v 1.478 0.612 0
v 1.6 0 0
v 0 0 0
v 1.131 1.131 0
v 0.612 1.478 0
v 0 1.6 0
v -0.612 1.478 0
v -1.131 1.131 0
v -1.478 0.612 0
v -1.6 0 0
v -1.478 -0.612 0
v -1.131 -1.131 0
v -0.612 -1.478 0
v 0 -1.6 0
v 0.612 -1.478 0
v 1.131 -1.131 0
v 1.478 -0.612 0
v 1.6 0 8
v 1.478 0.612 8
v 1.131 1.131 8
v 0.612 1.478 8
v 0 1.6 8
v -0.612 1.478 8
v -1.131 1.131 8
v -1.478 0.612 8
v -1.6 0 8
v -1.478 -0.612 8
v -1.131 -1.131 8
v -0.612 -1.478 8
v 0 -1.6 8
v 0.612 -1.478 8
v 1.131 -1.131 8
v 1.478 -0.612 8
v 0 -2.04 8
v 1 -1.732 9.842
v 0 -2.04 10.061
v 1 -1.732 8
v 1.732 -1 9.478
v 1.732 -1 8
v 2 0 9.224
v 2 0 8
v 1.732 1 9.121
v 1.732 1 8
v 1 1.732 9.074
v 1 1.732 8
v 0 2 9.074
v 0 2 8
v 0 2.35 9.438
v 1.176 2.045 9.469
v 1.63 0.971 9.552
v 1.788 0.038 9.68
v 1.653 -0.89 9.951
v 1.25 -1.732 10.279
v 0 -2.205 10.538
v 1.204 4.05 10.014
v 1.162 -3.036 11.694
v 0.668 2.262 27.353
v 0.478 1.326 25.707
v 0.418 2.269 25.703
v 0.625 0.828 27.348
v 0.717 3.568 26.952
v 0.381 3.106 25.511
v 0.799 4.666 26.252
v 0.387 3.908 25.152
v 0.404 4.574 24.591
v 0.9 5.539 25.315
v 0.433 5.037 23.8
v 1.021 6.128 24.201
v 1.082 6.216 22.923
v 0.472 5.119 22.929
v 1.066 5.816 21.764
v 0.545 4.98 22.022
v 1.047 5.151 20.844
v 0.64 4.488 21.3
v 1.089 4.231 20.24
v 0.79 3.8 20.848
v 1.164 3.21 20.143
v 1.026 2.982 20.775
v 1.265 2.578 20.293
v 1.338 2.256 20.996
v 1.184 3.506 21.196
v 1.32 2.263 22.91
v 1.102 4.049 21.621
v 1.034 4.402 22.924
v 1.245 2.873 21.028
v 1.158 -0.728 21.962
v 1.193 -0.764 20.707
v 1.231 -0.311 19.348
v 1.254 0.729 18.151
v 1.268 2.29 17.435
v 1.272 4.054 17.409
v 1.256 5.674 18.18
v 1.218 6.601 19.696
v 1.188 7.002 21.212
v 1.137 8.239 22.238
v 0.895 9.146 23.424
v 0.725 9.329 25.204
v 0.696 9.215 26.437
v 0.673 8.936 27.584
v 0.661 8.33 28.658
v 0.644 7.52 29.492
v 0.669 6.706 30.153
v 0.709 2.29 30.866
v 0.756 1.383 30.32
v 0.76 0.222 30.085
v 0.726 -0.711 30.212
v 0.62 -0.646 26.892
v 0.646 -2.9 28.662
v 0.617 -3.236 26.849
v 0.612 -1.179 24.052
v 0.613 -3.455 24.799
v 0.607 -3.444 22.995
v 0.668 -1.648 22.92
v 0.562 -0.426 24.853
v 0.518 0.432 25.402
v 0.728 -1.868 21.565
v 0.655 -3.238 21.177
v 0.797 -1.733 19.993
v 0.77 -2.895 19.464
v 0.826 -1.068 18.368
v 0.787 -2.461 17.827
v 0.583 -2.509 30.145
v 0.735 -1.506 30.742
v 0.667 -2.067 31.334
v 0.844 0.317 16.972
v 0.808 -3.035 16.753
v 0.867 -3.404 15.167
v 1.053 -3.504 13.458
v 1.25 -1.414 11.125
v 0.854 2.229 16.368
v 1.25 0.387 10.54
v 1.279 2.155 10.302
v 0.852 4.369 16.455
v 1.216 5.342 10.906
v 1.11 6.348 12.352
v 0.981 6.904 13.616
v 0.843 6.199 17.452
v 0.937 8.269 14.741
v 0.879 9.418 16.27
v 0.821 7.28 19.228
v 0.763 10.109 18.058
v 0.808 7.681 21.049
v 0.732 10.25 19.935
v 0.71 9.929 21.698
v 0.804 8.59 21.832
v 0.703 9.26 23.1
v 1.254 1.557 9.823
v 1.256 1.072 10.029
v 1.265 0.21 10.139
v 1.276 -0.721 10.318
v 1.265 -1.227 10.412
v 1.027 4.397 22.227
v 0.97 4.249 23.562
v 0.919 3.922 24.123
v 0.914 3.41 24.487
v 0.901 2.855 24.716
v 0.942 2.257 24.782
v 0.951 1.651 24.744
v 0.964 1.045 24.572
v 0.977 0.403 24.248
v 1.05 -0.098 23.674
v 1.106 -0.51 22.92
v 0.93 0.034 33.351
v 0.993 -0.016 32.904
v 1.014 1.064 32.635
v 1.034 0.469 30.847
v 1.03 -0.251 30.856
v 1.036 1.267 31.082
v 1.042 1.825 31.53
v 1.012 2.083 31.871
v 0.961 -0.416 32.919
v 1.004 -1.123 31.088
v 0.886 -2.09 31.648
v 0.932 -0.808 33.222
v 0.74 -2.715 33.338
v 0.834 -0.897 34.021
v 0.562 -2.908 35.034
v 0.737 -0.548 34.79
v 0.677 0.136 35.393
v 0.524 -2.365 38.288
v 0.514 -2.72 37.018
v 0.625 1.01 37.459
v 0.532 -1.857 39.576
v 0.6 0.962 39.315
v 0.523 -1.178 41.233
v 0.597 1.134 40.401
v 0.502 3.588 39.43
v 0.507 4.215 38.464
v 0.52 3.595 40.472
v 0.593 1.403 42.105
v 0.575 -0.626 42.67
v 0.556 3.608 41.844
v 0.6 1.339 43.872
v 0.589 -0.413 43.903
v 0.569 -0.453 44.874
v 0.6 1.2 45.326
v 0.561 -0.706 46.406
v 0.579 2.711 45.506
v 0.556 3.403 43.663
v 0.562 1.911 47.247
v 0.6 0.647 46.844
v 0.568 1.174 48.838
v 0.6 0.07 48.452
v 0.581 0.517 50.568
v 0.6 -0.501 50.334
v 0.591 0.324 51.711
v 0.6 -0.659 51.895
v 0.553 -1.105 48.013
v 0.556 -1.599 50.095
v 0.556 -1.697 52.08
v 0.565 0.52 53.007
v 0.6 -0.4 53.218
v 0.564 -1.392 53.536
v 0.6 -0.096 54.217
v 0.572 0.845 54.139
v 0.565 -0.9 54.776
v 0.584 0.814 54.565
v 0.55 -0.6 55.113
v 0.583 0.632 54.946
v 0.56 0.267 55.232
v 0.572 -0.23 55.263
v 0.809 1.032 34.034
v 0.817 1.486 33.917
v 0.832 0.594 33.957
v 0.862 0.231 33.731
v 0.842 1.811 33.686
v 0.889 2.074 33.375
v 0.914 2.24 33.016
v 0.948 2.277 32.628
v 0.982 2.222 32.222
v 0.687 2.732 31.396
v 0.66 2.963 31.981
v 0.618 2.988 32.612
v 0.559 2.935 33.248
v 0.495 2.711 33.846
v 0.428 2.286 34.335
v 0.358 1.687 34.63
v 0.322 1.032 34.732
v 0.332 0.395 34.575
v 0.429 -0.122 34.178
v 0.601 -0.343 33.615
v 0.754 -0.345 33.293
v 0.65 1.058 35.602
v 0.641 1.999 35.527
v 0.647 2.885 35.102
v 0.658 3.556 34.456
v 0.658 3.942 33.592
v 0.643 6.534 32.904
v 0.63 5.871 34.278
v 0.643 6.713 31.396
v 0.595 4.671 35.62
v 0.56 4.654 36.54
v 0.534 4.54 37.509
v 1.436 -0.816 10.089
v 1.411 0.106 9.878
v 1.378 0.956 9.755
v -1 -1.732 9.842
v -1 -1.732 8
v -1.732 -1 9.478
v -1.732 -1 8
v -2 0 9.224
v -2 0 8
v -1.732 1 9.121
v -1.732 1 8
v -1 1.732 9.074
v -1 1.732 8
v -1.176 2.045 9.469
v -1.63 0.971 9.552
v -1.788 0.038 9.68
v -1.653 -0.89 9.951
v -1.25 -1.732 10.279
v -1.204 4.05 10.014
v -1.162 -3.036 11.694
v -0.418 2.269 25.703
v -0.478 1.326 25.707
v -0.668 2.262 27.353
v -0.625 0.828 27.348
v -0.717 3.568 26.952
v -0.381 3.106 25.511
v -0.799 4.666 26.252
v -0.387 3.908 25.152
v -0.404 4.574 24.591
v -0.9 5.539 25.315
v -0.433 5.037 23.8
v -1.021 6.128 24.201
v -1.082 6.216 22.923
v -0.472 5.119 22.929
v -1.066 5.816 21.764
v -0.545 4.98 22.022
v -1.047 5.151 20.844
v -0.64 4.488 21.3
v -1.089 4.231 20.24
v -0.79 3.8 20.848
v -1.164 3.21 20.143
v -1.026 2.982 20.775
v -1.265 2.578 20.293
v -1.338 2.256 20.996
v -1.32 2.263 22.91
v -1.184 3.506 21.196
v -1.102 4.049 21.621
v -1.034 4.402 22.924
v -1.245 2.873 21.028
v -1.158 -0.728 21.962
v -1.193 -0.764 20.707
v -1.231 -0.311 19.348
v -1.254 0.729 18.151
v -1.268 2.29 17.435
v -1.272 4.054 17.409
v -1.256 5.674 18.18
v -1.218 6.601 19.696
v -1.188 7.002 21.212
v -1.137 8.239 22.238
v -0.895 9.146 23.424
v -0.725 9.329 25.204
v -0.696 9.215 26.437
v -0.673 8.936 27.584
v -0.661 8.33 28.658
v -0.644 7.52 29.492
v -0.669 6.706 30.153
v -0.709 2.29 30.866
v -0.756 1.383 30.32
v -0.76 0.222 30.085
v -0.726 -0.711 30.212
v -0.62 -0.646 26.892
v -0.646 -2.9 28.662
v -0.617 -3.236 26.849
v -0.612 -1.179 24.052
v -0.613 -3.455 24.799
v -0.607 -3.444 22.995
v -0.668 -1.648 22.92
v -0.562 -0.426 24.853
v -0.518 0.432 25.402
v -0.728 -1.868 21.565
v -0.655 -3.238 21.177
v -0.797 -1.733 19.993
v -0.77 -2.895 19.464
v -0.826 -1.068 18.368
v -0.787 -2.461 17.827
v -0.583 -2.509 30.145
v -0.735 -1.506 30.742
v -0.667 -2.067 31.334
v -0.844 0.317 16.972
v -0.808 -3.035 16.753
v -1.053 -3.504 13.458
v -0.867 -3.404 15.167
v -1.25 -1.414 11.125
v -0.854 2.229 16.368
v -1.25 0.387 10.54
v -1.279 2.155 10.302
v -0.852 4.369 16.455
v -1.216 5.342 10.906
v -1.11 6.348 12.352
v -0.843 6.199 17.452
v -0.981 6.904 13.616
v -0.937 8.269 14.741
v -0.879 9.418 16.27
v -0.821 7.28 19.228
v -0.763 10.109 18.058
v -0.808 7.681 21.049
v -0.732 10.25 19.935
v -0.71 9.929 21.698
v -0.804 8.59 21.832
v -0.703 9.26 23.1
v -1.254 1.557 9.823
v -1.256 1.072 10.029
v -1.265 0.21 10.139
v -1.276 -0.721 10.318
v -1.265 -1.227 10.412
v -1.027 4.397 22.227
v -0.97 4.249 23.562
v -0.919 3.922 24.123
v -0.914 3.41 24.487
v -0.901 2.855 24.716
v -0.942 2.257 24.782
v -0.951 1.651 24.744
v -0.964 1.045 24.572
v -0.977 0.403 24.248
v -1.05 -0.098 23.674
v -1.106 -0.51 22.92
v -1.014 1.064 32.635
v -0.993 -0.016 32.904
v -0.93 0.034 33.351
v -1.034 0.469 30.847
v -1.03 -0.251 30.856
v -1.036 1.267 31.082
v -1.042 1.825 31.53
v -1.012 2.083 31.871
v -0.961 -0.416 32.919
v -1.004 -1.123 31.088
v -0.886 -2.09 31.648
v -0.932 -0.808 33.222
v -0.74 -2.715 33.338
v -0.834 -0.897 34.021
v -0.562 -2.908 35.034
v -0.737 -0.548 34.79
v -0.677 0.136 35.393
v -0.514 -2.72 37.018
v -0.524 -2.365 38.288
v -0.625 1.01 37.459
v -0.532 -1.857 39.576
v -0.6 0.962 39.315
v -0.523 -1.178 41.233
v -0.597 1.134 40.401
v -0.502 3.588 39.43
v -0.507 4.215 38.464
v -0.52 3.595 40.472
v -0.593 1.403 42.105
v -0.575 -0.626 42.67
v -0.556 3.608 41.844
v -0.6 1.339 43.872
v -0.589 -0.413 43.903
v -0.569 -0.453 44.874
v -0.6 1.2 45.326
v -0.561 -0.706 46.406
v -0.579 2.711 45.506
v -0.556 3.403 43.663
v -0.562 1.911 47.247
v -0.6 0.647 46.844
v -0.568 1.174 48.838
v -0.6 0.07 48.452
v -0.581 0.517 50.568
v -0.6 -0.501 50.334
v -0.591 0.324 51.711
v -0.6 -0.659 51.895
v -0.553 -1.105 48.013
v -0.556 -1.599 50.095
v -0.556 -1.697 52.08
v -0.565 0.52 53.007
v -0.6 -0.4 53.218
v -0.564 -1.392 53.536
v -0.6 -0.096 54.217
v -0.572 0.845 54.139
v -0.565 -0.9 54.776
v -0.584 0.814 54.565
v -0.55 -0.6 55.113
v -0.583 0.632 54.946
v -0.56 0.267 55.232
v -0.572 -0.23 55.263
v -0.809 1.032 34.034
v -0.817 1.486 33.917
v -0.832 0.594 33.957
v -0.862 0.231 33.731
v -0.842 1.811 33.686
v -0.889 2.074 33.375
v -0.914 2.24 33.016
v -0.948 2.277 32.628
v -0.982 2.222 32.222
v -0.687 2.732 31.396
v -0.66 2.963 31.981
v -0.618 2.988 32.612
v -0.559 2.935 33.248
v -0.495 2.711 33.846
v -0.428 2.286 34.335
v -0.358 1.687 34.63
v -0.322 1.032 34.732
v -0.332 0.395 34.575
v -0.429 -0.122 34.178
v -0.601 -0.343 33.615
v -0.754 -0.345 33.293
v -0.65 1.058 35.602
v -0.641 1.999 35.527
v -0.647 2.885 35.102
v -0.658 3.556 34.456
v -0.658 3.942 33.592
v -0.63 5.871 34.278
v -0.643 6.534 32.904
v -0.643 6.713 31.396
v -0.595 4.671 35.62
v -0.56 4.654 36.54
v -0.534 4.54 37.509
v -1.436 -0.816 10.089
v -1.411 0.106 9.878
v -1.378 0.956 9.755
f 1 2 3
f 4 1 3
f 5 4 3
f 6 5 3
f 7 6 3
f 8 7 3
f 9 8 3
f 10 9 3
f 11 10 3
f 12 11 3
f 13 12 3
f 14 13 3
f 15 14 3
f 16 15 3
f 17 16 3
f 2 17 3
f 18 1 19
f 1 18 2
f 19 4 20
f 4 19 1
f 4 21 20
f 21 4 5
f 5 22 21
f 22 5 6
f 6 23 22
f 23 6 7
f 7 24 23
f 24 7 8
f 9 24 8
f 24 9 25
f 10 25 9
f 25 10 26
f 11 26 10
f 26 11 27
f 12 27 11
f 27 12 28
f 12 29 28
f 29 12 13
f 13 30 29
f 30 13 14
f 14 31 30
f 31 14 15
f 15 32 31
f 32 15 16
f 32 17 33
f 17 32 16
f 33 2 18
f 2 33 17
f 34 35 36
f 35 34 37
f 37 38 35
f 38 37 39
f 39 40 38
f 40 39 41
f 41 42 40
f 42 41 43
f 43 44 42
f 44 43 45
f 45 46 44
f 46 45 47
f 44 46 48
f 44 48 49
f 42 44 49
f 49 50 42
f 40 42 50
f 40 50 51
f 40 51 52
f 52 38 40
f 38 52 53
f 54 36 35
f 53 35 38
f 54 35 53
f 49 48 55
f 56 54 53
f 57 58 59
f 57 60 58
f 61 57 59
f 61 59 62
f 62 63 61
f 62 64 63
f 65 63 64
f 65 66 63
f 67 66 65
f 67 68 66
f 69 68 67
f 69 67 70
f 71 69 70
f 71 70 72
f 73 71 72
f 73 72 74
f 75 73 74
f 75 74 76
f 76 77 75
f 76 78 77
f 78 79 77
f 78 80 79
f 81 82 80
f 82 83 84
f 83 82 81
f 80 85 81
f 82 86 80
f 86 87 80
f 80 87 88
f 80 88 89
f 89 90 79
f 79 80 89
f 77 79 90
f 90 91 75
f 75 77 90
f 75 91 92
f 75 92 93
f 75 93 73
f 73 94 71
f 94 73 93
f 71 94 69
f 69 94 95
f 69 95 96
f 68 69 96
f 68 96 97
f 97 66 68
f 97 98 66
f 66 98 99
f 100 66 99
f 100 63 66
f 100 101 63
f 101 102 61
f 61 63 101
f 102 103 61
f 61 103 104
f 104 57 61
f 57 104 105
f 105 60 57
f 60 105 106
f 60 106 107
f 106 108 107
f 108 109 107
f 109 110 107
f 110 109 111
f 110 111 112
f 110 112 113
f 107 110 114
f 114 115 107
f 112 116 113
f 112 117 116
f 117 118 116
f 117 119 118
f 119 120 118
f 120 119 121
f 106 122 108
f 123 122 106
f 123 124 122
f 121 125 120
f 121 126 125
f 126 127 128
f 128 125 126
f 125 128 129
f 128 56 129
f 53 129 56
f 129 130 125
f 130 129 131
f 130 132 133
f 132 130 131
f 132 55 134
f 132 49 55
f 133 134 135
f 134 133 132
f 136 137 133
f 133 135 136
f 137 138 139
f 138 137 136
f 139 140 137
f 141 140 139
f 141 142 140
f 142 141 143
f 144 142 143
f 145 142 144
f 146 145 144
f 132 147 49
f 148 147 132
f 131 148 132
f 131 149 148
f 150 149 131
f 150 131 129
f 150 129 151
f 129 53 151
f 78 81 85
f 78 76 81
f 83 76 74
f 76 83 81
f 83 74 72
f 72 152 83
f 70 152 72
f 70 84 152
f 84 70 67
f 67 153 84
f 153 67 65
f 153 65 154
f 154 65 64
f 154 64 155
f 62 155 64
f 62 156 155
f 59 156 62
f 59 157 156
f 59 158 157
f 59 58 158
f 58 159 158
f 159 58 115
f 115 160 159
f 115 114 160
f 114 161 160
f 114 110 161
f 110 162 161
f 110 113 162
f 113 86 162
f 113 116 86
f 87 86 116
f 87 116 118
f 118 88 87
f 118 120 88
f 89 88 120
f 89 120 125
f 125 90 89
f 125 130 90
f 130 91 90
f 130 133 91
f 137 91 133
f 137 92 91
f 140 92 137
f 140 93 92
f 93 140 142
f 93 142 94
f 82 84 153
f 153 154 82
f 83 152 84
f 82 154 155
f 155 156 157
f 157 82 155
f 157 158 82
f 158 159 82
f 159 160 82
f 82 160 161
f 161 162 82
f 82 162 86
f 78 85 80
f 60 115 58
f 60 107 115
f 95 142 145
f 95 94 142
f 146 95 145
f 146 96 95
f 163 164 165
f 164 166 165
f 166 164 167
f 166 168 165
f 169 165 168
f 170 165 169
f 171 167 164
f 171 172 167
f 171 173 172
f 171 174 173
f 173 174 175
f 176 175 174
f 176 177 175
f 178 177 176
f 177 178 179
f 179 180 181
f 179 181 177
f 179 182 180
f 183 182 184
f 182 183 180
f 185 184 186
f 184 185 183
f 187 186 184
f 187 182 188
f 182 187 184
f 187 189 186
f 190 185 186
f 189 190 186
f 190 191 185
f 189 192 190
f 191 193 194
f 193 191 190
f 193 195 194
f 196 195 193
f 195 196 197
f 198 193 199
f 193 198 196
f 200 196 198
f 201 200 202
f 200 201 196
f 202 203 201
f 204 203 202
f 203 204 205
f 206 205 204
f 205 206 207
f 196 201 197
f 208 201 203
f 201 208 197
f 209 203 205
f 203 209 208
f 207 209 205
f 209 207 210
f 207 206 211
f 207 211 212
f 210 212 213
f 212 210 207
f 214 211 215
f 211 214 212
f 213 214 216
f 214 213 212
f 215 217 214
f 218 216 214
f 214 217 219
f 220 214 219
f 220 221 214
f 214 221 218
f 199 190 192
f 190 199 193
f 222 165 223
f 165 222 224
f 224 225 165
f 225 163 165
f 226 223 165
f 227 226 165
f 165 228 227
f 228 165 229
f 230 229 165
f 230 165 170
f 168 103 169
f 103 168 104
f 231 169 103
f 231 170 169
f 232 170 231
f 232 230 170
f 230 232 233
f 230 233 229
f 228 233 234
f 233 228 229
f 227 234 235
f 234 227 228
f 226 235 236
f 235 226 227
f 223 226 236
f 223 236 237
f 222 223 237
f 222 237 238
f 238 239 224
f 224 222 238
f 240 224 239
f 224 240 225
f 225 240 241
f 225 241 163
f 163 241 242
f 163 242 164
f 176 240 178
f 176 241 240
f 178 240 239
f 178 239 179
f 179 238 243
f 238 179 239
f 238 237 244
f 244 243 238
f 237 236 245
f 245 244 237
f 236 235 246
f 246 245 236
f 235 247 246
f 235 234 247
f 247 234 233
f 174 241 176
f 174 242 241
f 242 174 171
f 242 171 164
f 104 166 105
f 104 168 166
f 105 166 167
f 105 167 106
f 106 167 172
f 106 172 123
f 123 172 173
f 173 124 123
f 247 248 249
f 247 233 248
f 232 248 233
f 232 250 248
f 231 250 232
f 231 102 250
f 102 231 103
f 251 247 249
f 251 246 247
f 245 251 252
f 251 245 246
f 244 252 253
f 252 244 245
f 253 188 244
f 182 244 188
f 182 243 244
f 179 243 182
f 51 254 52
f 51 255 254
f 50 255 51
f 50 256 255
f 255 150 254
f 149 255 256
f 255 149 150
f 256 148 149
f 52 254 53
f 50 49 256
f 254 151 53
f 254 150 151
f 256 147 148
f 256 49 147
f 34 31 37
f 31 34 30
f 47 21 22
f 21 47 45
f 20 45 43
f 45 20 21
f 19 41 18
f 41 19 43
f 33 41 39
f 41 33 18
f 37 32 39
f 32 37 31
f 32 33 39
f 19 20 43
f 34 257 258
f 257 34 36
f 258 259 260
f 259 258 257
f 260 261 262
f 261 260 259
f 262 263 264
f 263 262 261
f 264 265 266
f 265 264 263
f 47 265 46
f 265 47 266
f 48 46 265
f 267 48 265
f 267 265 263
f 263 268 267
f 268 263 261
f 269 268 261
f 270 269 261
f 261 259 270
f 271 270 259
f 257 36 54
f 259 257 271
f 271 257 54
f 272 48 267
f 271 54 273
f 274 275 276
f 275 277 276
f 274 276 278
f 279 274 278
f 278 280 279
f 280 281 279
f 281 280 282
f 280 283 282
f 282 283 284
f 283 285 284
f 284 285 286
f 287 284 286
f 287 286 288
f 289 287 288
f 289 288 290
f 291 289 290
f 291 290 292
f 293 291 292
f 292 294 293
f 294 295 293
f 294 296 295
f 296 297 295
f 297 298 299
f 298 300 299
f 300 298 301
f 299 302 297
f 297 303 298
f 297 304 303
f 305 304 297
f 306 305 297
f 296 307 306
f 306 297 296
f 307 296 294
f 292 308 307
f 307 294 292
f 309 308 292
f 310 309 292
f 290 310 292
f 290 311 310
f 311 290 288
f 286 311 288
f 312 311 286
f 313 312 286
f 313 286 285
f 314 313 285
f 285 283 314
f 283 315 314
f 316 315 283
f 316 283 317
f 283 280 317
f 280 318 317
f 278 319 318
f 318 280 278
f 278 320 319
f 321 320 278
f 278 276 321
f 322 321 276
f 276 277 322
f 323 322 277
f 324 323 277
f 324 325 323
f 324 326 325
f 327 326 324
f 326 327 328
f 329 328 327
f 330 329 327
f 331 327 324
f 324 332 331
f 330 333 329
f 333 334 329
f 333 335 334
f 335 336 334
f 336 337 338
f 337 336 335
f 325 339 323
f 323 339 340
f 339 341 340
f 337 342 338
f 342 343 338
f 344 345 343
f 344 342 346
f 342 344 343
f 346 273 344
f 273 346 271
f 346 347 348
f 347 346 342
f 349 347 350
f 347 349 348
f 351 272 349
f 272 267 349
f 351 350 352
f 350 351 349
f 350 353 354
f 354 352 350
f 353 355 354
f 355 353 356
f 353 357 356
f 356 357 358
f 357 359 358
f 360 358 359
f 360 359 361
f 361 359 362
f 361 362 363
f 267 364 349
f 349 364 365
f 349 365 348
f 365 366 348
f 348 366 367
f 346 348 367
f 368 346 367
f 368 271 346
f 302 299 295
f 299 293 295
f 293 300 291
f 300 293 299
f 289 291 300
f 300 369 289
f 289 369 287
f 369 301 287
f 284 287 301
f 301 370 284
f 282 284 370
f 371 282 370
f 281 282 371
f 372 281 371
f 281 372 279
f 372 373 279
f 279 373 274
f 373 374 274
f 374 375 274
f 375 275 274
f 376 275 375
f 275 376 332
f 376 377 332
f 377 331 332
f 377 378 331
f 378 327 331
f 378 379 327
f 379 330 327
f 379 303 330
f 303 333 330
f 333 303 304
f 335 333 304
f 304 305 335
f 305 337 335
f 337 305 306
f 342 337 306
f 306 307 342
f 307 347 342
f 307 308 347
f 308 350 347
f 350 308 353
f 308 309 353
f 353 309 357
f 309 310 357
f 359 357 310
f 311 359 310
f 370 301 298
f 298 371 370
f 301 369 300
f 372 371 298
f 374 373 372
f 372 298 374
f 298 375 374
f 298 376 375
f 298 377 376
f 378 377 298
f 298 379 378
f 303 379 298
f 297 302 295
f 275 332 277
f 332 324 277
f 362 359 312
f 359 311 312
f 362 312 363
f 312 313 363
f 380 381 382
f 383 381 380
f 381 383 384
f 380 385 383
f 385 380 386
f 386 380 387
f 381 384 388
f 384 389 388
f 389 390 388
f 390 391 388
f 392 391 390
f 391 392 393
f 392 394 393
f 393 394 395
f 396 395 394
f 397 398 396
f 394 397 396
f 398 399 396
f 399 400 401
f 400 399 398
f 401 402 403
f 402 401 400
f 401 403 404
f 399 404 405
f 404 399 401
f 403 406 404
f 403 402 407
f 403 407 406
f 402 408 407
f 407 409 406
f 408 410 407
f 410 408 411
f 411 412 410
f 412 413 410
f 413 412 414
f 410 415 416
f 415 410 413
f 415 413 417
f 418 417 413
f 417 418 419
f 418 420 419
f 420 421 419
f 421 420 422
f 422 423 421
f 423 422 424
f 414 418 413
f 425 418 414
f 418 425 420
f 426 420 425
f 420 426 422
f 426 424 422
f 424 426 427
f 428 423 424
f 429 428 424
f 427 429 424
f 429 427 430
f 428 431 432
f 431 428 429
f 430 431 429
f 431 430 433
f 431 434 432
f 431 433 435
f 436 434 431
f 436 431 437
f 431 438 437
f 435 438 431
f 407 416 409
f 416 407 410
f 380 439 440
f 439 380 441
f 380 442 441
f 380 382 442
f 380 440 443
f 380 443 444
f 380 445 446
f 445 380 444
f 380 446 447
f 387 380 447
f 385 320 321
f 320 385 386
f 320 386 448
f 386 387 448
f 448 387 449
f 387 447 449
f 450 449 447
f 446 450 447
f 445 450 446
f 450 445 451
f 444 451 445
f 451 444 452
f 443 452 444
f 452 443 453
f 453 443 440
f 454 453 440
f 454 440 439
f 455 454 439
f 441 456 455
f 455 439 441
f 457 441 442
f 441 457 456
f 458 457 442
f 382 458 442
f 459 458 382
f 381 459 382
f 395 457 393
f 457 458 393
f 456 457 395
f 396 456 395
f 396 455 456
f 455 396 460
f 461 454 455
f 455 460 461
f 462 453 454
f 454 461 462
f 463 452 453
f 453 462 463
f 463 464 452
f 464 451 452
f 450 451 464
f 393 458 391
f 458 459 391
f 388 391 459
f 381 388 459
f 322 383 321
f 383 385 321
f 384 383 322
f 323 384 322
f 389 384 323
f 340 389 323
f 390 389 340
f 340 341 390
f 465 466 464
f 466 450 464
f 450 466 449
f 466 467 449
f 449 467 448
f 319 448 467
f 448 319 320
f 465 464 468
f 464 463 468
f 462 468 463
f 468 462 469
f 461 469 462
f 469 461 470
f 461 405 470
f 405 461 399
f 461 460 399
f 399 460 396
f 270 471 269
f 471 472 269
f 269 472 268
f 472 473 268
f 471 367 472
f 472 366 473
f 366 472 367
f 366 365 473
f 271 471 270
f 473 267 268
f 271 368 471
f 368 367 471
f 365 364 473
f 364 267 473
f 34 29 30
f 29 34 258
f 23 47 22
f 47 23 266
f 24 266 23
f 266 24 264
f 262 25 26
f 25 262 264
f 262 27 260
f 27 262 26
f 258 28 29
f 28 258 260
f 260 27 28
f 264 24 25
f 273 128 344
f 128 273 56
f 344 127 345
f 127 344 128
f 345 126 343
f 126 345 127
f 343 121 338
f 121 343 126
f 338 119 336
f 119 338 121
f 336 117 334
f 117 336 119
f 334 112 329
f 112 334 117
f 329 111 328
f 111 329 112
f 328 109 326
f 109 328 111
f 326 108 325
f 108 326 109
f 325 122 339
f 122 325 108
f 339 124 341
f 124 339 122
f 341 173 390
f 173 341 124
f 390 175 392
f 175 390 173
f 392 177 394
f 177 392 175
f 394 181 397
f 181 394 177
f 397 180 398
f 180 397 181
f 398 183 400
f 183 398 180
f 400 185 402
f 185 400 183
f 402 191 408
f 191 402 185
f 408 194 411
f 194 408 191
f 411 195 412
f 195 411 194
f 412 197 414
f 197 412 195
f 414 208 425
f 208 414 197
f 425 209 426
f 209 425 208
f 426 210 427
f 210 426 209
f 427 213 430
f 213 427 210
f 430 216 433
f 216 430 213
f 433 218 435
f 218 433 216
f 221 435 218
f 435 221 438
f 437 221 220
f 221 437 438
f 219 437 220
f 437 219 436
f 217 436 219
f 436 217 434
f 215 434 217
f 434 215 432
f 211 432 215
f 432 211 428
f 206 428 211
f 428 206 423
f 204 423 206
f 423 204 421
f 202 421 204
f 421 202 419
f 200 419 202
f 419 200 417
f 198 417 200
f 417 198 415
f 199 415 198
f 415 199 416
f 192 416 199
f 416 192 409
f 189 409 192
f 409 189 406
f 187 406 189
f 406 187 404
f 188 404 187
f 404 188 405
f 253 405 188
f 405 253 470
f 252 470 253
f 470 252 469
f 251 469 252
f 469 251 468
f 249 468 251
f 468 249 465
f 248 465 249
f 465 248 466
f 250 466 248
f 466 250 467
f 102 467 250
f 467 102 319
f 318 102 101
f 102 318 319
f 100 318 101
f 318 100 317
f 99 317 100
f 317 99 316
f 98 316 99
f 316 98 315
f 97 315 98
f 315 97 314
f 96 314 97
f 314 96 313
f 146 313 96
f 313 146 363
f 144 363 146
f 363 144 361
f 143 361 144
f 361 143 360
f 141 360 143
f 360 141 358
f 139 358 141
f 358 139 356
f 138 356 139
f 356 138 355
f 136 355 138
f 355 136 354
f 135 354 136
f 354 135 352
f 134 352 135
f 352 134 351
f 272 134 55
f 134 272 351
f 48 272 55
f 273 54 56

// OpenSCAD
use <../lib.scad>
use <../p/4-4cylc.scad>
use <s/68547s01.scad>
function ldraw_lib__68547() = [
// 0 Cloud / Smoke Swirl with Bar  1L
// 0 Name: 68547.dat
// 0 Author: Philippe Hurbain [Philo]
// 0 !LDRAW_ORG Part UPDATE 2023-04
// 0 !LICENSE Licensed under CC BY 4.0 : see CAreadme.txt
// 
// 0 BFC CERTIFY CCW
  [0,"BFC","CERTIFY"],
  [0,"BFC","CCW"],
// 
// 0 !CATEGORY Minifig Accessory
// 0 !KEYWORDS Dust, Gust, Wave, Wind
// 
// 0 !HISTORY 2022-11-08 {LEGO Instructions App} Original part shape
// 0 !HISTORY 2022-11-08 [Philo] File preparation for LDraw Parts Tracker
// 0 !HISTORY 2023-08-25 [OrionP] Official Update 2023-04
// 
// 
// 1 16 0 0 0 4 0 0 0 -20 0 0 0 4 4-4cylc.dat
  [1,16,0,0,0,4,0,0,0,-20,0,0,0,4, ldraw_lib__4_4cylc()],
// 
// 1 16 0 0 0 1 0 0 0 1 0 0 0 1 s\68547s01.dat
  [1,16,0,0,0,1,0,0,0,1,0,0,0,1, ldraw_lib__s__68547s01()],
// 1 16 0 0 0 -1 0 0 0 1 0 0 0 1 s\68547s01.dat
  [1,16,0,0,0,-1,0,0,0,1,0,0,0,1, ldraw_lib__s__68547s01()],
// 2 24 1.968 -44.567 -6.152 -1.968 -44.567 -6.152
  [2,24,1.968,-44.567,-6.152,-1.968,-44.567,-6.152],
// 2 24 1.672 -75.382 16.765 -1.672 -75.382 16.765
  [2,24,1.672,-75.382,16.765,-1.672,-75.382,16.765],
// 5 24 3.01 -25.036 10.125 -3.01 -25.036 10.125 0 -23.594 5.876 -3.041 -27.265 13.355
  [5,24,3.01,-25.036,10.125,-3.01,-25.036,10.125,0,-23.594,5.876,-3.041,-27.265,13.355],
// 2 24 1.255 -98.574 8.97 -1.255 -98.574 8.97
  [2,24,1.255,-98.574,8.97,-1.255,-98.574,8.97],
// 2 24 1.4 -138.081 0.667 -1.4 -138.081 0.667
  [2,24,1.4,-138.081,0.667,-1.4,-138.081,0.667],
// 2 24 1.488 -89.051 11.677 -1.488 -89.051 11.677
  [2,24,1.488,-89.051,11.677,-1.488,-89.051,11.677],
// 4 16 2.904 -29.236 -7.591 2.633 -33.644 -8.76 -2.633 -33.644 -8.76 -2.904 -29.236 -7.591
  [4,16,2.904,-29.236,-7.591,2.633,-33.644,-8.76,-2.633,-33.644,-8.76,-2.904,-29.236,-7.591],
// 4 16 2.633 -33.644 -8.76 2.168 -37.917 -8.511 -2.168 -37.917 -8.511 -2.633 -33.644 -8.76
  [4,16,2.633,-33.644,-8.76,2.168,-37.917,-8.511,-2.168,-37.917,-8.511,-2.633,-33.644,-8.76],
// 4 16 2.168 -37.917 -8.511 2.02 -41.883 -7.587 -2.02 -41.883 -7.587 -2.168 -37.917 -8.511
  [4,16,2.168,-37.917,-8.511,2.02,-41.883,-7.587,-2.02,-41.883,-7.587,-2.168,-37.917,-8.511],
// 4 16 2.02 -41.883 -7.587 1.968 -44.567 -6.152 -1.968 -44.567 -6.152 -2.02 -41.883 -7.587
  [4,16,2.02,-41.883,-7.587,1.968,-44.567,-6.152,-1.968,-44.567,-6.152,-2.02,-41.883,-7.587],
// 4 16 1.968 -44.567 -6.152 1.925 -48.659 -7.237 -1.925 -48.659 -7.237 -1.968 -44.567 -6.152
  [4,16,1.968,-44.567,-6.152,1.925,-48.659,-7.237,-1.925,-48.659,-7.237,-1.968,-44.567,-6.152],
// 4 16 1.925 -48.659 -7.237 1.638 -52.942 -8.095 -1.638 -52.942 -8.095 -1.925 -48.659 -7.237
  [4,16,1.925,-48.659,-7.237,1.638,-52.942,-8.095,-1.638,-52.942,-8.095,-1.925,-48.659,-7.237],
// 4 16 1.638 -52.942 -8.095 1.517 -57.488 -8.609 -1.517 -57.488 -8.609 -1.638 -52.942 -8.095
  [4,16,1.638,-52.942,-8.095,1.517,-57.488,-8.609,-1.517,-57.488,-8.609,-1.638,-52.942,-8.095],
// 4 16 1.517 -57.488 -8.609 1.532 -61.997 -8.637 -1.532 -61.997 -8.637 -1.517 -57.488 -8.609
  [4,16,1.517,-57.488,-8.609,1.532,-61.997,-8.637,-1.532,-61.997,-8.637,-1.517,-57.488,-8.609],
// 4 16 1.532 -61.997 -8.637 1.542 -67.123 -8.089 -1.542 -67.123 -8.089 -1.532 -61.997 -8.637
  [4,16,1.532,-61.997,-8.637,1.542,-67.123,-8.089,-1.542,-67.123,-8.089,-1.532,-61.997,-8.637],
// 4 16 1.542 -67.123 -8.089 1.616 -71.656 -7.25 -1.616 -71.656 -7.25 -1.542 -67.123 -8.089
  [4,16,1.542,-67.123,-8.089,1.616,-71.656,-7.25,-1.616,-71.656,-7.25,-1.542,-67.123,-8.089],
// 4 16 1.616 -71.656 -7.25 1.457 -75.362 -6.272 -1.457 -75.362 -6.272 -1.616 -71.656 -7.25
  [4,16,1.616,-71.656,-7.25,1.457,-75.362,-6.272,-1.457,-75.362,-6.272,-1.616,-71.656,-7.25],
// 4 16 1.457 -75.362 -6.272 1.667 -78.334 -5.167 -1.667 -78.334 -5.167 -1.457 -75.362 -6.272
  [4,16,1.457,-75.362,-6.272,1.667,-78.334,-5.167,-1.667,-78.334,-5.167,-1.457,-75.362,-6.272],
// 4 16 1.667 -78.334 -5.167 2.214 -79.119 -5.224 -2.214 -79.119 -5.224 -1.667 -78.334 -5.167
  [4,16,1.667,-78.334,-5.167,2.214,-79.119,-5.224,-2.214,-79.119,-5.224,-1.667,-78.334,-5.167],
// 4 16 2.214 -79.119 -5.224 1.851 -83.346 -6.787 -1.851 -83.346 -6.787 -2.214 -79.119 -5.224
  [4,16,2.214,-79.119,-5.224,1.851,-83.346,-6.787,-1.851,-83.346,-6.787,-2.214,-79.119,-5.224],
// 4 16 1.851 -83.346 -6.787 1.406 -87.586 -7.271 -1.406 -87.586 -7.271 -1.851 -83.346 -6.787
  [4,16,1.851,-83.346,-6.787,1.406,-87.586,-7.271,-1.406,-87.586,-7.271,-1.851,-83.346,-6.787],
// 4 16 1.406 -87.586 -7.271 1.285 -92.546 -6.799 -1.285 -92.546 -6.799 -1.406 -87.586 -7.271
  [4,16,1.406,-87.586,-7.271,1.285,-92.546,-6.799,-1.285,-92.546,-6.799,-1.406,-87.586,-7.271],
// 4 16 1.285 -92.546 -6.799 1.309 -95.72 -5.913 -1.309 -95.72 -5.913 -1.285 -92.546 -6.799
  [4,16,1.285,-92.546,-6.799,1.309,-95.72,-5.913,-1.309,-95.72,-5.913,-1.285,-92.546,-6.799],
// 4 16 1.309 -95.72 -5.913 1.33 -98.939 -4.643 -1.33 -98.939 -4.643 -1.309 -95.72 -5.913
  [4,16,1.309,-95.72,-5.913,1.33,-98.939,-4.643,-1.33,-98.939,-4.643,-1.309,-95.72,-5.913],
// 4 16 1.33 -98.939 -4.643 1.308 -103.082 -2.944 -1.308 -103.082 -2.944 -1.33 -98.939 -4.643
  [4,16,1.33,-98.939,-4.643,1.308,-103.082,-2.944,-1.308,-103.082,-2.944,-1.33,-98.939,-4.643],
// 4 16 1.308 -103.082 -2.944 1.438 -106.674 -1.566 -1.438 -106.674 -1.566 -1.308 -103.082 -2.944
  [4,16,1.308,-103.082,-2.944,1.438,-106.674,-1.566,-1.438,-106.674,-1.566,-1.308,-103.082,-2.944],
// 4 16 1.438 -106.674 -1.566 1.472 -109.757 -1.033 -1.472 -109.757 -1.033 -1.438 -106.674 -1.566
  [4,16,1.438,-106.674,-1.566,1.472,-109.757,-1.033,-1.472,-109.757,-1.033,-1.438,-106.674,-1.566],
// 4 16 1.472 -109.757 -1.033 1.422 -112.185 -1.133 -1.422 -112.185 -1.133 -1.472 -109.757 -1.033
  [4,16,1.472,-109.757,-1.033,1.422,-112.185,-1.133,-1.422,-112.185,-1.133,-1.472,-109.757,-1.033],
// 4 16 1.422 -112.185 -1.133 1.403 -116.015 -1.765 -1.403 -116.015 -1.765 -1.422 -112.185 -1.133
  [4,16,1.422,-112.185,-1.133,1.403,-116.015,-1.765,-1.403,-116.015,-1.765,-1.422,-112.185,-1.133],
// 4 16 1.403 -116.015 -1.765 1.382 -120.032 -2.762 -1.382 -120.032 -2.762 -1.403 -116.015 -1.765
  [4,16,1.403,-116.015,-1.765,1.382,-120.032,-2.762,-1.382,-120.032,-2.762,-1.403,-116.015,-1.765],
// 4 16 1.382 -120.032 -2.762 1.391 -125.238 -3.997 -1.391 -125.238 -3.997 -1.382 -120.032 -2.762
  [4,16,1.382,-120.032,-2.762,1.391,-125.238,-3.997,-1.391,-125.238,-3.997,-1.382,-120.032,-2.762],
// 4 16 1.391 -125.238 -3.997 1.391 -130.2 -4.243 -1.391 -130.2 -4.243 -1.391 -125.238 -3.997
  [4,16,1.391,-125.238,-3.997,1.391,-130.2,-4.243,-1.391,-130.2,-4.243,-1.391,-125.238,-3.997],
// 4 16 1.391 -130.2 -4.243 1.411 -133.839 -3.481 -1.411 -133.839 -3.481 -1.391 -130.2 -4.243
  [4,16,1.391,-130.2,-4.243,1.411,-133.839,-3.481,-1.411,-133.839,-3.481,-1.391,-130.2,-4.243],
// 4 16 1.411 -133.839 -3.481 1.412 -136.939 -2.251 -1.412 -136.939 -2.251 -1.411 -133.839 -3.481
  [4,16,1.411,-133.839,-3.481,1.412,-136.939,-2.251,-1.412,-136.939,-2.251,-1.411,-133.839,-3.481],
// 4 16 1.412 -136.939 -2.251 1.375 -137.782 -1.501 -1.375 -137.782 -1.501 -1.412 -136.939 -2.251
  [4,16,1.412,-136.939,-2.251,1.375,-137.782,-1.501,-1.375,-137.782,-1.501,-1.412,-136.939,-2.251],
// 4 16 1.375 -137.782 -1.501 1.429 -138.157 -0.575 -1.429 -138.157 -0.575 -1.375 -137.782 -1.501
  [4,16,1.375,-137.782,-1.501,1.429,-138.157,-0.575,-1.429,-138.157,-0.575,-1.375,-137.782,-1.501],
// 4 16 1.429 -138.157 -0.575 1.4 -138.081 0.667 -1.4 -138.081 0.667 -1.429 -138.157 -0.575
  [4,16,1.429,-138.157,-0.575,1.4,-138.081,0.667,-1.4,-138.081,0.667,-1.429,-138.157,-0.575],
// 4 16 1.4 -138.081 0.667 1.457 -137.365 1.579 -1.457 -137.365 1.579 -1.4 -138.081 0.667
  [4,16,1.4,-138.081,0.667,1.457,-137.365,1.579,-1.457,-137.365,1.579,-1.4,-138.081,0.667],
// 4 16 1.457 -137.365 1.579 1.461 -136.413 2.036 -1.461 -136.413 2.036 -1.457 -137.365 1.579
  [4,16,1.457,-137.365,1.579,1.461,-136.413,2.036,-1.461,-136.413,2.036,-1.457,-137.365,1.579],
// 4 16 1.461 -136.413 2.036 1.43 -135.348 2.113 -1.43 -135.348 2.113 -1.461 -136.413 2.036
  [4,16,1.461,-136.413,2.036,1.43,-135.348,2.113,-1.43,-135.348,2.113,-1.461,-136.413,2.036],
// 4 16 1.43 -135.348 2.113 1.413 -132.518 1.301 -1.413 -132.518 1.301 -1.43 -135.348 2.113
  [4,16,1.43,-135.348,2.113,1.413,-132.518,1.301,-1.413,-132.518,1.301,-1.43,-135.348,2.113],
// 4 16 1.413 -132.518 1.301 1.478 -129.278 0.809 -1.478 -129.278 0.809 -1.413 -132.518 1.301
  [4,16,1.413,-132.518,1.301,1.478,-129.278,0.809,-1.478,-129.278,0.809,-1.413,-132.518,1.301],
// 4 16 1.478 -129.278 0.809 1.452 -126.42 1.292 -1.452 -126.42 1.292 -1.478 -129.278 0.809
  [4,16,1.478,-129.278,0.809,1.452,-126.42,1.292,-1.452,-126.42,1.292,-1.478,-129.278,0.809],
// 4 16 1.452 -126.42 1.292 1.42 -122.094 2.935 -1.42 -122.094 2.935 -1.452 -126.42 1.292
  [4,16,1.452,-126.42,1.292,1.42,-122.094,2.935,-1.42,-122.094,2.935,-1.452,-126.42,1.292],
// 4 16 1.42 -122.094 2.935 1.405 -118.117 4.777 -1.405 -118.117 4.777 -1.42 -122.094 2.935
  [4,16,1.42,-122.094,2.935,1.405,-118.117,4.777,-1.405,-118.117,4.777,-1.42,-122.094,2.935],
// 4 16 1.405 -118.117 4.777 1.448 -113.764 6.778 -1.448 -113.764 6.778 -1.405 -118.117 4.777
  [4,16,1.405,-118.117,4.777,1.448,-113.764,6.778,-1.448,-113.764,6.778,-1.405,-118.117,4.777],
// 4 16 1.448 -113.764 6.778 1.391 -109.158 8.508 -1.391 -109.158 8.508 -1.448 -113.764 6.778
  [4,16,1.448,-113.764,6.778,1.391,-109.158,8.508,-1.391,-109.158,8.508,-1.448,-113.764,6.778],
// 4 16 1.391 -109.158 8.508 1.391 -104.61 9.021 -1.391 -104.61 9.021 -1.391 -109.158 8.508
  [4,16,1.391,-109.158,8.508,1.391,-104.61,9.021,-1.391,-104.61,9.021,-1.391,-109.158,8.508],
// 4 16 1.391 -104.61 9.021 1.301 -101.179 8.988 -1.301 -101.179 8.988 -1.391 -104.61 9.021
  [4,16,1.391,-104.61,9.021,1.301,-101.179,8.988,-1.301,-101.179,8.988,-1.391,-104.61,9.021],
// 4 16 1.301 -101.179 8.988 1.255 -98.574 8.97 -1.255 -98.574 8.97 -1.301 -101.179 8.988
  [4,16,1.301,-101.179,8.988,1.255,-98.574,8.97,-1.255,-98.574,8.97,-1.301,-101.179,8.988],
// 4 16 1.255 -98.574 8.97 1.267 -96.161 10.537 -1.267 -96.161 10.537 -1.255 -98.574 8.97
  [4,16,1.255,-98.574,8.97,1.267,-96.161,10.537,-1.267,-96.161,10.537,-1.255,-98.574,8.97],
// 4 16 1.267 -96.161 10.537 1.335 -93.773 11.351 -1.335 -93.773 11.351 -1.267 -96.161 10.537
  [4,16,1.267,-96.161,10.537,1.335,-93.773,11.351,-1.335,-93.773,11.351,-1.267,-96.161,10.537],
// 4 16 1.335 -93.773 11.351 1.401 -91.35 11.634 -1.401 -91.35 11.634 -1.335 -93.773 11.351
  [4,16,1.335,-93.773,11.351,1.401,-91.35,11.634,-1.401,-91.35,11.634,-1.335,-93.773,11.351],
// 4 16 1.401 -91.35 11.634 1.488 -89.051 11.677 -1.488 -89.051 11.677 -1.401 -91.35 11.634
  [4,16,1.401,-91.35,11.634,1.488,-89.051,11.677,-1.488,-89.051,11.677,-1.401,-91.35,11.634],
// 4 16 1.488 -89.051 11.677 1.575 -85.696 14.678 -1.575 -85.696 14.678 -1.488 -89.051 11.677
  [4,16,1.488,-89.051,11.677,1.575,-85.696,14.678,-1.575,-85.696,14.678,-1.488,-89.051,11.677],
// 4 16 1.575 -85.696 14.678 1.607 -82.26 16.336 -1.607 -82.26 16.336 -1.575 -85.696 14.678
  [4,16,1.575,-85.696,14.678,1.607,-82.26,16.336,-1.607,-82.26,16.336,-1.575,-85.696,14.678],
// 4 16 1.607 -82.26 16.336 1.608 -78.49 16.783 -1.608 -78.49 16.783 -1.607 -82.26 16.336
  [4,16,1.607,-82.26,16.336,1.608,-78.49,16.783,-1.608,-78.49,16.783,-1.607,-82.26,16.336],
// 4 16 1.608 -78.49 16.783 1.672 -75.382 16.765 -1.672 -75.382 16.765 -1.608 -78.49 16.783
  [4,16,1.608,-78.49,16.783,1.672,-75.382,16.765,-1.672,-75.382,16.765,-1.608,-78.49,16.783],
// 4 16 1.672 -75.382 16.765 1.609 -73.73 18.8 -1.609 -73.73 18.8 -1.672 -75.382 16.765
  [4,16,1.672,-75.382,16.765,1.609,-73.73,18.8,-1.609,-73.73,18.8,-1.672,-75.382,16.765],
// 4 16 1.609 -73.73 18.8 1.653 -71.644 20.826 -1.653 -71.644 20.826 -1.609 -73.73 18.8
  [4,16,1.609,-73.73,18.8,1.653,-71.644,20.826,-1.653,-71.644,20.826,-1.609,-73.73,18.8],
// 4 16 1.653 -71.644 20.826 1.682 -68.961 22.34 -1.682 -68.961 22.34 -1.653 -71.644 20.826
  [4,16,1.653,-71.644,20.826,1.682,-68.961,22.34,-1.682,-68.961,22.34,-1.653,-71.644,20.826],
// 4 16 1.682 -68.961 22.34 1.739 -66.093 23.037 -1.739 -66.093 23.037 -1.682 -68.961 22.34
  [4,16,1.682,-68.961,22.34,1.739,-66.093,23.037,-1.739,-66.093,23.037,-1.682,-68.961,22.34],
// 4 16 1.739 -66.093 23.037 1.813 -63.011 23.322 -1.813 -63.011 23.322 -1.739 -66.093 23.037
  [4,16,1.739,-66.093,23.037,1.813,-63.011,23.322,-1.813,-63.011,23.322,-1.739,-66.093,23.037],
// 4 16 1.813 -63.011 23.322 2.237 -58.561 22.866 -2.237 -58.561 22.866 -1.813 -63.011 23.322
  [4,16,1.813,-63.011,23.322,2.237,-58.561,22.866,-2.237,-58.561,22.866,-1.813,-63.011,23.322],
// 4 16 2.237 -58.561 22.866 1.757 -57.751 23.151 -1.757 -57.751 23.151 -2.237 -58.561 22.866
  [4,16,2.237,-58.561,22.866,1.757,-57.751,23.151,-1.757,-57.751,23.151,-2.237,-58.561,22.866],
// 4 16 1.757 -57.751 23.151 1.775 -54.246 24.822 -1.775 -54.246 24.822 -1.757 -57.751 23.151
  [4,16,1.757,-57.751,23.151,1.775,-54.246,24.822,-1.775,-54.246,24.822,-1.757,-57.751,23.151],
// 4 16 1.775 -54.246 24.822 1.829 -49.838 25.625 -1.829 -49.838 25.625 -1.775 -54.246 24.822
  [4,16,1.775,-54.246,24.822,1.829,-49.838,25.625,-1.829,-49.838,25.625,-1.775,-54.246,24.822],
// 4 16 1.829 -49.838 25.625 1.908 -45.145 25.273 -1.908 -45.145 25.273 -1.829 -49.838 25.625
  [4,16,1.829,-49.838,25.625,1.908,-45.145,25.273,-1.908,-45.145,25.273,-1.829,-49.838,25.625],
// 4 16 1.908 -45.145 25.273 2.198 -40.676 23.546 -2.198 -40.676 23.546 -1.908 -45.145 25.273
  [4,16,1.908,-45.145,25.273,2.198,-40.676,23.546,-2.198,-40.676,23.546,-1.908,-45.145,25.273],
// 4 16 2.198 -40.676 23.546 2.342 -36.852 20.672 -2.342 -36.852 20.672 -2.198 -40.676 23.546
  [4,16,2.198,-40.676,23.546,2.342,-36.852,20.672,-2.342,-36.852,20.672,-2.198,-40.676,23.546],
// 4 16 2.342 -36.852 20.672 2.452 -34.039 17.261 -2.452 -34.039 17.261 -2.342 -36.852 20.672
  [4,16,2.342,-36.852,20.672,2.452,-34.039,17.261,-2.452,-34.039,17.261,-2.342,-36.852,20.672],
// 4 16 2.452 -34.039 17.261 2.774 -30.88 15.869 -2.774 -30.88 15.869 -2.452 -34.039 17.261
  [4,16,2.452,-34.039,17.261,2.774,-30.88,15.869,-2.774,-30.88,15.869,-2.452,-34.039,17.261],
// 4 16 2.774 -30.88 15.869 3.041 -27.265 13.355 -3.041 -27.265 13.355 -2.774 -30.88 15.869
  [4,16,2.774,-30.88,15.869,3.041,-27.265,13.355,-3.041,-27.265,13.355,-2.774,-30.88,15.869],
// 4 16 3.041 -27.265 13.355 3.01 -25.036 10.125 -3.01 -25.036 10.125 -3.041 -27.265 13.355
  [4,16,3.041,-27.265,13.355,3.01,-25.036,10.125,-3.01,-25.036,10.125,-3.041,-27.265,13.355],
// 5 24 1.438 -106.674 -1.566 -1.438 -106.674 -1.566 1.472 -109.757 -1.033 1.308 -103.082 -2.944
  [5,24,1.438,-106.674,-1.566,-1.438,-106.674,-1.566,1.472,-109.757,-1.033,1.308,-103.082,-2.944],
// 5 24 1.472 -109.757 -1.033 -1.472 -109.757 -1.033 1.422 -112.185 -1.133 1.438 -106.674 -1.566
  [5,24,1.472,-109.757,-1.033,-1.472,-109.757,-1.033,1.422,-112.185,-1.133,1.438,-106.674,-1.566],
// 5 24 1.422 -112.185 -1.133 -1.422 -112.185 -1.133 1.403 -116.015 -1.765 1.472 -109.757 -1.033
  [5,24,1.422,-112.185,-1.133,-1.422,-112.185,-1.133,1.403,-116.015,-1.765,1.472,-109.757,-1.033],
// 5 24 1.403 -116.015 -1.765 -1.403 -116.015 -1.765 1.382 -120.032 -2.762 1.422 -112.185 -1.133
  [5,24,1.403,-116.015,-1.765,-1.403,-116.015,-1.765,1.382,-120.032,-2.762,1.422,-112.185,-1.133],
// 5 24 1.382 -120.032 -2.762 -1.382 -120.032 -2.762 1.391 -125.238 -3.997 1.403 -116.015 -1.765
  [5,24,1.382,-120.032,-2.762,-1.382,-120.032,-2.762,1.391,-125.238,-3.997,1.403,-116.015,-1.765],
// 5 24 1.391 -125.238 -3.997 -1.391 -125.238 -3.997 1.391 -130.2 -4.243 1.382 -120.032 -2.762
  [5,24,1.391,-125.238,-3.997,-1.391,-125.238,-3.997,1.391,-130.2,-4.243,1.382,-120.032,-2.762],
// 5 24 1.391 -130.2 -4.243 -1.391 -130.2 -4.243 1.411 -133.839 -3.481 1.391 -125.238 -3.997
  [5,24,1.391,-130.2,-4.243,-1.391,-130.2,-4.243,1.411,-133.839,-3.481,1.391,-125.238,-3.997],
// 5 24 1.411 -133.839 -3.481 -1.411 -133.839 -3.481 1.412 -136.939 -2.251 1.391 -130.2 -4.243
  [5,24,1.411,-133.839,-3.481,-1.411,-133.839,-3.481,1.412,-136.939,-2.251,1.391,-130.2,-4.243],
// 5 24 1.412 -136.939 -2.251 -1.412 -136.939 -2.251 1.375 -137.782 -1.501 1.411 -133.839 -3.481
  [5,24,1.412,-136.939,-2.251,-1.412,-136.939,-2.251,1.375,-137.782,-1.501,1.411,-133.839,-3.481],
// 5 24 1.375 -137.782 -1.501 -1.375 -137.782 -1.501 1.429 -138.157 -0.575 1.412 -136.939 -2.251
  [5,24,1.375,-137.782,-1.501,-1.375,-137.782,-1.501,1.429,-138.157,-0.575,1.412,-136.939,-2.251],
// 5 24 1.429 -138.157 -0.575 -1.429 -138.157 -0.575 1.4 -138.081 0.667 1.375 -137.782 -1.501
  [5,24,1.429,-138.157,-0.575,-1.429,-138.157,-0.575,1.4,-138.081,0.667,1.375,-137.782,-1.501],
// 5 24 1.457 -137.365 1.579 -1.457 -137.365 1.579 1.461 -136.413 2.036 1.4 -138.081 0.667
  [5,24,1.457,-137.365,1.579,-1.457,-137.365,1.579,1.461,-136.413,2.036,1.4,-138.081,0.667],
// 5 24 1.461 -136.413 2.036 -1.461 -136.413 2.036 1.43 -135.348 2.113 1.457 -137.365 1.579
  [5,24,1.461,-136.413,2.036,-1.461,-136.413,2.036,1.43,-135.348,2.113,1.457,-137.365,1.579],
// 5 24 1.43 -135.348 2.113 -1.43 -135.348 2.113 1.413 -132.518 1.301 1.461 -136.413 2.036
  [5,24,1.43,-135.348,2.113,-1.43,-135.348,2.113,1.413,-132.518,1.301,1.461,-136.413,2.036],
// 5 24 1.413 -132.518 1.301 -1.413 -132.518 1.301 1.478 -129.278 0.809 1.43 -135.348 2.113
  [5,24,1.413,-132.518,1.301,-1.413,-132.518,1.301,1.478,-129.278,0.809,1.43,-135.348,2.113],
// 5 24 1.478 -129.278 0.809 -1.478 -129.278 0.809 1.452 -126.42 1.292 1.413 -132.518 1.301
  [5,24,1.478,-129.278,0.809,-1.478,-129.278,0.809,1.452,-126.42,1.292,1.413,-132.518,1.301],
// 5 24 1.452 -126.42 1.292 -1.452 -126.42 1.292 1.42 -122.094 2.935 1.478 -129.278 0.809
  [5,24,1.452,-126.42,1.292,-1.452,-126.42,1.292,1.42,-122.094,2.935,1.478,-129.278,0.809],
// 5 24 1.42 -122.094 2.935 -1.42 -122.094 2.935 1.405 -118.117 4.777 1.452 -126.42 1.292
  [5,24,1.42,-122.094,2.935,-1.42,-122.094,2.935,1.405,-118.117,4.777,1.452,-126.42,1.292],
// 5 24 1.405 -118.117 4.777 -1.405 -118.117 4.777 1.448 -113.764 6.778 1.42 -122.094 2.935
  [5,24,1.405,-118.117,4.777,-1.405,-118.117,4.777,1.448,-113.764,6.778,1.42,-122.094,2.935],
// 5 24 1.448 -113.764 6.778 -1.448 -113.764 6.778 1.391 -109.158 8.508 1.405 -118.117 4.777
  [5,24,1.448,-113.764,6.778,-1.448,-113.764,6.778,1.391,-109.158,8.508,1.405,-118.117,4.777],
// 5 24 1.391 -109.158 8.508 -1.391 -109.158 8.508 1.391 -104.61 9.021 1.448 -113.764 6.778
  [5,24,1.391,-109.158,8.508,-1.391,-109.158,8.508,1.391,-104.61,9.021,1.448,-113.764,6.778],
// 5 24 1.391 -104.61 9.021 -1.391 -104.61 9.021 1.301 -101.179 8.988 1.391 -109.158 8.508
  [5,24,1.391,-104.61,9.021,-1.391,-104.61,9.021,1.301,-101.179,8.988,1.391,-109.158,8.508],
// 5 24 1.301 -101.179 8.988 -1.301 -101.179 8.988 1.255 -98.574 8.97 1.391 -104.61 9.021
  [5,24,1.301,-101.179,8.988,-1.301,-101.179,8.988,1.255,-98.574,8.97,1.391,-104.61,9.021],
// 5 24 1.267 -96.161 10.537 -1.267 -96.161 10.537 1.335 -93.773 11.351 1.255 -98.574 8.97
  [5,24,1.267,-96.161,10.537,-1.267,-96.161,10.537,1.335,-93.773,11.351,1.255,-98.574,8.97],
// 5 24 1.335 -93.773 11.351 -1.335 -93.773 11.351 1.401 -91.35 11.634 1.267 -96.161 10.537
  [5,24,1.335,-93.773,11.351,-1.335,-93.773,11.351,1.401,-91.35,11.634,1.267,-96.161,10.537],
// 5 24 1.401 -91.35 11.634 -1.401 -91.35 11.634 1.488 -89.051 11.677 1.335 -93.773 11.351
  [5,24,1.401,-91.35,11.634,-1.401,-91.35,11.634,1.488,-89.051,11.677,1.335,-93.773,11.351],
// 5 24 1.575 -85.696 14.678 -1.575 -85.696 14.678 1.607 -82.26 16.336 1.488 -89.051 11.677
  [5,24,1.575,-85.696,14.678,-1.575,-85.696,14.678,1.607,-82.26,16.336,1.488,-89.051,11.677],
// 5 24 1.607 -82.26 16.336 -1.607 -82.26 16.336 1.608 -78.49 16.783 1.575 -85.696 14.678
  [5,24,1.607,-82.26,16.336,-1.607,-82.26,16.336,1.608,-78.49,16.783,1.575,-85.696,14.678],
// 5 24 1.608 -78.49 16.783 -1.608 -78.49 16.783 1.672 -75.382 16.765 1.607 -82.26 16.336
  [5,24,1.608,-78.49,16.783,-1.608,-78.49,16.783,1.672,-75.382,16.765,1.607,-82.26,16.336],
// 5 24 1.609 -73.73 18.8 -1.609 -73.73 18.8 1.653 -71.644 20.826 1.672 -75.382 16.765
  [5,24,1.609,-73.73,18.8,-1.609,-73.73,18.8,1.653,-71.644,20.826,1.672,-75.382,16.765],
// 5 24 1.653 -71.644 20.826 -1.653 -71.644 20.826 1.682 -68.961 22.34 1.609 -73.73 18.8
  [5,24,1.653,-71.644,20.826,-1.653,-71.644,20.826,1.682,-68.961,22.34,1.609,-73.73,18.8],
// 5 24 1.682 -68.961 22.34 -1.682 -68.961 22.34 1.739 -66.093 23.037 1.653 -71.644 20.826
  [5,24,1.682,-68.961,22.34,-1.682,-68.961,22.34,1.739,-66.093,23.037,1.653,-71.644,20.826],
// 5 24 1.739 -66.093 23.037 -1.739 -66.093 23.037 1.813 -63.011 23.322 1.682 -68.961 22.34
  [5,24,1.739,-66.093,23.037,-1.739,-66.093,23.037,1.813,-63.011,23.322,1.682,-68.961,22.34],
// 5 24 1.813 -63.011 23.322 -1.813 -63.011 23.322 2.237 -58.561 22.866 1.739 -66.093 23.037
  [5,24,1.813,-63.011,23.322,-1.813,-63.011,23.322,2.237,-58.561,22.866,1.739,-66.093,23.037],
// 2 24 2.237 -58.561 22.866 -2.237 -58.561 22.866
  [2,24,2.237,-58.561,22.866,-2.237,-58.561,22.866],
// 5 24 1.757 -57.751 23.151 -1.757 -57.751 23.151 1.775 -54.246 24.822 2.237 -58.561 22.866
  [5,24,1.757,-57.751,23.151,-1.757,-57.751,23.151,1.775,-54.246,24.822,2.237,-58.561,22.866],
// 5 24 1.775 -54.246 24.822 -1.775 -54.246 24.822 1.829 -49.838 25.625 1.757 -57.751 23.151
  [5,24,1.775,-54.246,24.822,-1.775,-54.246,24.822,1.829,-49.838,25.625,1.757,-57.751,23.151],
// 5 24 1.829 -49.838 25.625 -1.829 -49.838 25.625 1.908 -45.145 25.273 1.775 -54.246 24.822
  [5,24,1.829,-49.838,25.625,-1.829,-49.838,25.625,1.908,-45.145,25.273,1.775,-54.246,24.822],
// 5 24 1.908 -45.145 25.273 -1.908 -45.145 25.273 2.198 -40.676 23.546 1.829 -49.838 25.625
  [5,24,1.908,-45.145,25.273,-1.908,-45.145,25.273,2.198,-40.676,23.546,1.829,-49.838,25.625],
// 5 24 2.198 -40.676 23.546 -2.198 -40.676 23.546 2.342 -36.852 20.672 1.908 -45.145 25.273
  [5,24,2.198,-40.676,23.546,-2.198,-40.676,23.546,2.342,-36.852,20.672,1.908,-45.145,25.273],
// 5 24 2.342 -36.852 20.672 -2.342 -36.852 20.672 2.452 -34.039 17.261 2.198 -40.676 23.546
  [5,24,2.342,-36.852,20.672,-2.342,-36.852,20.672,2.452,-34.039,17.261,2.198,-40.676,23.546],
// 2 24 2.452 -34.039 17.261 -2.452 -34.039 17.261
  [2,24,2.452,-34.039,17.261,-2.452,-34.039,17.261],
// 5 24 2.774 -30.88 15.869 -2.774 -30.88 15.869 3.041 -27.265 13.355 2.452 -34.039 17.261
  [5,24,2.774,-30.88,15.869,-2.774,-30.88,15.869,3.041,-27.265,13.355,2.452,-34.039,17.261],
// 5 24 3.041 -27.265 13.355 -3.041 -27.265 13.355 3.01 -25.036 10.125 2.774 -30.88 15.869
  [5,24,3.041,-27.265,13.355,-3.041,-27.265,13.355,3.01,-25.036,10.125,2.774,-30.88,15.869],
// 5 24 2.633 -33.644 -8.76 -2.633 -33.644 -8.76 2.168 -37.917 -8.511 2.904 -29.236 -7.591
  [5,24,2.633,-33.644,-8.76,-2.633,-33.644,-8.76,2.168,-37.917,-8.511,2.904,-29.236,-7.591],
// 5 24 2.168 -37.917 -8.511 -2.168 -37.917 -8.511 2.02 -41.883 -7.587 2.633 -33.644 -8.76
  [5,24,2.168,-37.917,-8.511,-2.168,-37.917,-8.511,2.02,-41.883,-7.587,2.633,-33.644,-8.76],
// 5 24 2.02 -41.883 -7.587 -2.02 -41.883 -7.587 1.968 -44.567 -6.152 2.168 -37.917 -8.511
  [5,24,2.02,-41.883,-7.587,-2.02,-41.883,-7.587,1.968,-44.567,-6.152,2.168,-37.917,-8.511],
// 5 24 1.925 -48.659 -7.237 -1.925 -48.659 -7.237 1.638 -52.942 -8.095 1.968 -44.567 -6.152
  [5,24,1.925,-48.659,-7.237,-1.925,-48.659,-7.237,1.638,-52.942,-8.095,1.968,-44.567,-6.152],
// 5 24 1.638 -52.942 -8.095 -1.638 -52.942 -8.095 1.517 -57.488 -8.609 1.925 -48.659 -7.237
  [5,24,1.638,-52.942,-8.095,-1.638,-52.942,-8.095,1.517,-57.488,-8.609,1.925,-48.659,-7.237],
// 5 24 1.517 -57.488 -8.609 -1.517 -57.488 -8.609 1.532 -61.997 -8.637 1.638 -52.942 -8.095
  [5,24,1.517,-57.488,-8.609,-1.517,-57.488,-8.609,1.532,-61.997,-8.637,1.638,-52.942,-8.095],
// 5 24 1.532 -61.997 -8.637 -1.532 -61.997 -8.637 1.542 -67.123 -8.089 1.517 -57.488 -8.609
  [5,24,1.532,-61.997,-8.637,-1.532,-61.997,-8.637,1.542,-67.123,-8.089,1.517,-57.488,-8.609],
// 5 24 1.542 -67.123 -8.089 -1.542 -67.123 -8.089 1.616 -71.656 -7.25 1.532 -61.997 -8.637
  [5,24,1.542,-67.123,-8.089,-1.542,-67.123,-8.089,1.616,-71.656,-7.25,1.532,-61.997,-8.637],
// 5 24 1.616 -71.656 -7.25 -1.616 -71.656 -7.25 1.457 -75.362 -6.272 1.542 -67.123 -8.089
  [5,24,1.616,-71.656,-7.25,-1.616,-71.656,-7.25,1.457,-75.362,-6.272,1.542,-67.123,-8.089],
// 5 24 1.457 -75.362 -6.272 -1.457 -75.362 -6.272 1.667 -78.334 -5.167 1.616 -71.656 -7.25
  [5,24,1.457,-75.362,-6.272,-1.457,-75.362,-6.272,1.667,-78.334,-5.167,1.616,-71.656,-7.25],
// 2 24 1.667 -78.334 -5.167 -1.667 -78.334 -5.167
  [2,24,1.667,-78.334,-5.167,-1.667,-78.334,-5.167],
// 5 24 2.214 -79.119 -5.224 -2.214 -79.119 -5.224 1.851 -83.346 -6.787 1.667 -78.334 -5.167
  [5,24,2.214,-79.119,-5.224,-2.214,-79.119,-5.224,1.851,-83.346,-6.787,1.667,-78.334,-5.167],
// 5 24 1.851 -83.346 -6.787 -1.851 -83.346 -6.787 1.406 -87.586 -7.271 2.214 -79.119 -5.224
  [5,24,1.851,-83.346,-6.787,-1.851,-83.346,-6.787,1.406,-87.586,-7.271,2.214,-79.119,-5.224],
// 5 24 1.406 -87.586 -7.271 -1.406 -87.586 -7.271 1.285 -92.546 -6.799 1.851 -83.346 -6.787
  [5,24,1.406,-87.586,-7.271,-1.406,-87.586,-7.271,1.285,-92.546,-6.799,1.851,-83.346,-6.787],
// 5 24 1.285 -92.546 -6.799 -1.285 -92.546 -6.799 1.309 -95.72 -5.913 1.406 -87.586 -7.271
  [5,24,1.285,-92.546,-6.799,-1.285,-92.546,-6.799,1.309,-95.72,-5.913,1.406,-87.586,-7.271],
// 5 24 1.309 -95.72 -5.913 -1.309 -95.72 -5.913 1.33 -98.939 -4.643 1.285 -92.546 -6.799
  [5,24,1.309,-95.72,-5.913,-1.309,-95.72,-5.913,1.33,-98.939,-4.643,1.285,-92.546,-6.799],
// 5 24 1.33 -98.939 -4.643 -1.33 -98.939 -4.643 1.308 -103.082 -2.944 1.309 -95.72 -5.913
  [5,24,1.33,-98.939,-4.643,-1.33,-98.939,-4.643,1.308,-103.082,-2.944,1.309,-95.72,-5.913],
// 5 24 1.308 -103.082 -2.944 -1.308 -103.082 -2.944 1.438 -106.674 -1.566 1.33 -98.939 -4.643
  [5,24,1.308,-103.082,-2.944,-1.308,-103.082,-2.944,1.438,-106.674,-1.566,1.33,-98.939,-4.643],
// 3 16 0 -23.594 5.876 -3.01 -25.036 10.125 3.01 -25.036 10.125
  [3,16,0,-23.594,5.876,-3.01,-25.036,10.125,3.01,-25.036,10.125],
// 3 16 -2.904 -29.236 -7.591 0 -26.344 -5.512 2.904 -29.236 -7.591
  [3,16,-2.904,-29.236,-7.591,0,-26.344,-5.512,2.904,-29.236,-7.591],
// 5 24 2.904 -29.236 -7.591 -2.904 -29.236 -7.591 0 -26.344 -5.512 2.633 -33.644 -8.76
  [5,24,2.904,-29.236,-7.591,-2.904,-29.236,-7.591,0,-26.344,-5.512,2.633,-33.644,-8.76],
];
module ldraw_lib__68547(step=0, col=false, unit=2/5, alt=false, line=0.2, solid=!$preview)
    makepoly(ldraw_lib__68547(), step=step, col=col, unit=unit, alt=alt, line=line, solid=solid);
ldraw_lib__68547(line=0.2);
